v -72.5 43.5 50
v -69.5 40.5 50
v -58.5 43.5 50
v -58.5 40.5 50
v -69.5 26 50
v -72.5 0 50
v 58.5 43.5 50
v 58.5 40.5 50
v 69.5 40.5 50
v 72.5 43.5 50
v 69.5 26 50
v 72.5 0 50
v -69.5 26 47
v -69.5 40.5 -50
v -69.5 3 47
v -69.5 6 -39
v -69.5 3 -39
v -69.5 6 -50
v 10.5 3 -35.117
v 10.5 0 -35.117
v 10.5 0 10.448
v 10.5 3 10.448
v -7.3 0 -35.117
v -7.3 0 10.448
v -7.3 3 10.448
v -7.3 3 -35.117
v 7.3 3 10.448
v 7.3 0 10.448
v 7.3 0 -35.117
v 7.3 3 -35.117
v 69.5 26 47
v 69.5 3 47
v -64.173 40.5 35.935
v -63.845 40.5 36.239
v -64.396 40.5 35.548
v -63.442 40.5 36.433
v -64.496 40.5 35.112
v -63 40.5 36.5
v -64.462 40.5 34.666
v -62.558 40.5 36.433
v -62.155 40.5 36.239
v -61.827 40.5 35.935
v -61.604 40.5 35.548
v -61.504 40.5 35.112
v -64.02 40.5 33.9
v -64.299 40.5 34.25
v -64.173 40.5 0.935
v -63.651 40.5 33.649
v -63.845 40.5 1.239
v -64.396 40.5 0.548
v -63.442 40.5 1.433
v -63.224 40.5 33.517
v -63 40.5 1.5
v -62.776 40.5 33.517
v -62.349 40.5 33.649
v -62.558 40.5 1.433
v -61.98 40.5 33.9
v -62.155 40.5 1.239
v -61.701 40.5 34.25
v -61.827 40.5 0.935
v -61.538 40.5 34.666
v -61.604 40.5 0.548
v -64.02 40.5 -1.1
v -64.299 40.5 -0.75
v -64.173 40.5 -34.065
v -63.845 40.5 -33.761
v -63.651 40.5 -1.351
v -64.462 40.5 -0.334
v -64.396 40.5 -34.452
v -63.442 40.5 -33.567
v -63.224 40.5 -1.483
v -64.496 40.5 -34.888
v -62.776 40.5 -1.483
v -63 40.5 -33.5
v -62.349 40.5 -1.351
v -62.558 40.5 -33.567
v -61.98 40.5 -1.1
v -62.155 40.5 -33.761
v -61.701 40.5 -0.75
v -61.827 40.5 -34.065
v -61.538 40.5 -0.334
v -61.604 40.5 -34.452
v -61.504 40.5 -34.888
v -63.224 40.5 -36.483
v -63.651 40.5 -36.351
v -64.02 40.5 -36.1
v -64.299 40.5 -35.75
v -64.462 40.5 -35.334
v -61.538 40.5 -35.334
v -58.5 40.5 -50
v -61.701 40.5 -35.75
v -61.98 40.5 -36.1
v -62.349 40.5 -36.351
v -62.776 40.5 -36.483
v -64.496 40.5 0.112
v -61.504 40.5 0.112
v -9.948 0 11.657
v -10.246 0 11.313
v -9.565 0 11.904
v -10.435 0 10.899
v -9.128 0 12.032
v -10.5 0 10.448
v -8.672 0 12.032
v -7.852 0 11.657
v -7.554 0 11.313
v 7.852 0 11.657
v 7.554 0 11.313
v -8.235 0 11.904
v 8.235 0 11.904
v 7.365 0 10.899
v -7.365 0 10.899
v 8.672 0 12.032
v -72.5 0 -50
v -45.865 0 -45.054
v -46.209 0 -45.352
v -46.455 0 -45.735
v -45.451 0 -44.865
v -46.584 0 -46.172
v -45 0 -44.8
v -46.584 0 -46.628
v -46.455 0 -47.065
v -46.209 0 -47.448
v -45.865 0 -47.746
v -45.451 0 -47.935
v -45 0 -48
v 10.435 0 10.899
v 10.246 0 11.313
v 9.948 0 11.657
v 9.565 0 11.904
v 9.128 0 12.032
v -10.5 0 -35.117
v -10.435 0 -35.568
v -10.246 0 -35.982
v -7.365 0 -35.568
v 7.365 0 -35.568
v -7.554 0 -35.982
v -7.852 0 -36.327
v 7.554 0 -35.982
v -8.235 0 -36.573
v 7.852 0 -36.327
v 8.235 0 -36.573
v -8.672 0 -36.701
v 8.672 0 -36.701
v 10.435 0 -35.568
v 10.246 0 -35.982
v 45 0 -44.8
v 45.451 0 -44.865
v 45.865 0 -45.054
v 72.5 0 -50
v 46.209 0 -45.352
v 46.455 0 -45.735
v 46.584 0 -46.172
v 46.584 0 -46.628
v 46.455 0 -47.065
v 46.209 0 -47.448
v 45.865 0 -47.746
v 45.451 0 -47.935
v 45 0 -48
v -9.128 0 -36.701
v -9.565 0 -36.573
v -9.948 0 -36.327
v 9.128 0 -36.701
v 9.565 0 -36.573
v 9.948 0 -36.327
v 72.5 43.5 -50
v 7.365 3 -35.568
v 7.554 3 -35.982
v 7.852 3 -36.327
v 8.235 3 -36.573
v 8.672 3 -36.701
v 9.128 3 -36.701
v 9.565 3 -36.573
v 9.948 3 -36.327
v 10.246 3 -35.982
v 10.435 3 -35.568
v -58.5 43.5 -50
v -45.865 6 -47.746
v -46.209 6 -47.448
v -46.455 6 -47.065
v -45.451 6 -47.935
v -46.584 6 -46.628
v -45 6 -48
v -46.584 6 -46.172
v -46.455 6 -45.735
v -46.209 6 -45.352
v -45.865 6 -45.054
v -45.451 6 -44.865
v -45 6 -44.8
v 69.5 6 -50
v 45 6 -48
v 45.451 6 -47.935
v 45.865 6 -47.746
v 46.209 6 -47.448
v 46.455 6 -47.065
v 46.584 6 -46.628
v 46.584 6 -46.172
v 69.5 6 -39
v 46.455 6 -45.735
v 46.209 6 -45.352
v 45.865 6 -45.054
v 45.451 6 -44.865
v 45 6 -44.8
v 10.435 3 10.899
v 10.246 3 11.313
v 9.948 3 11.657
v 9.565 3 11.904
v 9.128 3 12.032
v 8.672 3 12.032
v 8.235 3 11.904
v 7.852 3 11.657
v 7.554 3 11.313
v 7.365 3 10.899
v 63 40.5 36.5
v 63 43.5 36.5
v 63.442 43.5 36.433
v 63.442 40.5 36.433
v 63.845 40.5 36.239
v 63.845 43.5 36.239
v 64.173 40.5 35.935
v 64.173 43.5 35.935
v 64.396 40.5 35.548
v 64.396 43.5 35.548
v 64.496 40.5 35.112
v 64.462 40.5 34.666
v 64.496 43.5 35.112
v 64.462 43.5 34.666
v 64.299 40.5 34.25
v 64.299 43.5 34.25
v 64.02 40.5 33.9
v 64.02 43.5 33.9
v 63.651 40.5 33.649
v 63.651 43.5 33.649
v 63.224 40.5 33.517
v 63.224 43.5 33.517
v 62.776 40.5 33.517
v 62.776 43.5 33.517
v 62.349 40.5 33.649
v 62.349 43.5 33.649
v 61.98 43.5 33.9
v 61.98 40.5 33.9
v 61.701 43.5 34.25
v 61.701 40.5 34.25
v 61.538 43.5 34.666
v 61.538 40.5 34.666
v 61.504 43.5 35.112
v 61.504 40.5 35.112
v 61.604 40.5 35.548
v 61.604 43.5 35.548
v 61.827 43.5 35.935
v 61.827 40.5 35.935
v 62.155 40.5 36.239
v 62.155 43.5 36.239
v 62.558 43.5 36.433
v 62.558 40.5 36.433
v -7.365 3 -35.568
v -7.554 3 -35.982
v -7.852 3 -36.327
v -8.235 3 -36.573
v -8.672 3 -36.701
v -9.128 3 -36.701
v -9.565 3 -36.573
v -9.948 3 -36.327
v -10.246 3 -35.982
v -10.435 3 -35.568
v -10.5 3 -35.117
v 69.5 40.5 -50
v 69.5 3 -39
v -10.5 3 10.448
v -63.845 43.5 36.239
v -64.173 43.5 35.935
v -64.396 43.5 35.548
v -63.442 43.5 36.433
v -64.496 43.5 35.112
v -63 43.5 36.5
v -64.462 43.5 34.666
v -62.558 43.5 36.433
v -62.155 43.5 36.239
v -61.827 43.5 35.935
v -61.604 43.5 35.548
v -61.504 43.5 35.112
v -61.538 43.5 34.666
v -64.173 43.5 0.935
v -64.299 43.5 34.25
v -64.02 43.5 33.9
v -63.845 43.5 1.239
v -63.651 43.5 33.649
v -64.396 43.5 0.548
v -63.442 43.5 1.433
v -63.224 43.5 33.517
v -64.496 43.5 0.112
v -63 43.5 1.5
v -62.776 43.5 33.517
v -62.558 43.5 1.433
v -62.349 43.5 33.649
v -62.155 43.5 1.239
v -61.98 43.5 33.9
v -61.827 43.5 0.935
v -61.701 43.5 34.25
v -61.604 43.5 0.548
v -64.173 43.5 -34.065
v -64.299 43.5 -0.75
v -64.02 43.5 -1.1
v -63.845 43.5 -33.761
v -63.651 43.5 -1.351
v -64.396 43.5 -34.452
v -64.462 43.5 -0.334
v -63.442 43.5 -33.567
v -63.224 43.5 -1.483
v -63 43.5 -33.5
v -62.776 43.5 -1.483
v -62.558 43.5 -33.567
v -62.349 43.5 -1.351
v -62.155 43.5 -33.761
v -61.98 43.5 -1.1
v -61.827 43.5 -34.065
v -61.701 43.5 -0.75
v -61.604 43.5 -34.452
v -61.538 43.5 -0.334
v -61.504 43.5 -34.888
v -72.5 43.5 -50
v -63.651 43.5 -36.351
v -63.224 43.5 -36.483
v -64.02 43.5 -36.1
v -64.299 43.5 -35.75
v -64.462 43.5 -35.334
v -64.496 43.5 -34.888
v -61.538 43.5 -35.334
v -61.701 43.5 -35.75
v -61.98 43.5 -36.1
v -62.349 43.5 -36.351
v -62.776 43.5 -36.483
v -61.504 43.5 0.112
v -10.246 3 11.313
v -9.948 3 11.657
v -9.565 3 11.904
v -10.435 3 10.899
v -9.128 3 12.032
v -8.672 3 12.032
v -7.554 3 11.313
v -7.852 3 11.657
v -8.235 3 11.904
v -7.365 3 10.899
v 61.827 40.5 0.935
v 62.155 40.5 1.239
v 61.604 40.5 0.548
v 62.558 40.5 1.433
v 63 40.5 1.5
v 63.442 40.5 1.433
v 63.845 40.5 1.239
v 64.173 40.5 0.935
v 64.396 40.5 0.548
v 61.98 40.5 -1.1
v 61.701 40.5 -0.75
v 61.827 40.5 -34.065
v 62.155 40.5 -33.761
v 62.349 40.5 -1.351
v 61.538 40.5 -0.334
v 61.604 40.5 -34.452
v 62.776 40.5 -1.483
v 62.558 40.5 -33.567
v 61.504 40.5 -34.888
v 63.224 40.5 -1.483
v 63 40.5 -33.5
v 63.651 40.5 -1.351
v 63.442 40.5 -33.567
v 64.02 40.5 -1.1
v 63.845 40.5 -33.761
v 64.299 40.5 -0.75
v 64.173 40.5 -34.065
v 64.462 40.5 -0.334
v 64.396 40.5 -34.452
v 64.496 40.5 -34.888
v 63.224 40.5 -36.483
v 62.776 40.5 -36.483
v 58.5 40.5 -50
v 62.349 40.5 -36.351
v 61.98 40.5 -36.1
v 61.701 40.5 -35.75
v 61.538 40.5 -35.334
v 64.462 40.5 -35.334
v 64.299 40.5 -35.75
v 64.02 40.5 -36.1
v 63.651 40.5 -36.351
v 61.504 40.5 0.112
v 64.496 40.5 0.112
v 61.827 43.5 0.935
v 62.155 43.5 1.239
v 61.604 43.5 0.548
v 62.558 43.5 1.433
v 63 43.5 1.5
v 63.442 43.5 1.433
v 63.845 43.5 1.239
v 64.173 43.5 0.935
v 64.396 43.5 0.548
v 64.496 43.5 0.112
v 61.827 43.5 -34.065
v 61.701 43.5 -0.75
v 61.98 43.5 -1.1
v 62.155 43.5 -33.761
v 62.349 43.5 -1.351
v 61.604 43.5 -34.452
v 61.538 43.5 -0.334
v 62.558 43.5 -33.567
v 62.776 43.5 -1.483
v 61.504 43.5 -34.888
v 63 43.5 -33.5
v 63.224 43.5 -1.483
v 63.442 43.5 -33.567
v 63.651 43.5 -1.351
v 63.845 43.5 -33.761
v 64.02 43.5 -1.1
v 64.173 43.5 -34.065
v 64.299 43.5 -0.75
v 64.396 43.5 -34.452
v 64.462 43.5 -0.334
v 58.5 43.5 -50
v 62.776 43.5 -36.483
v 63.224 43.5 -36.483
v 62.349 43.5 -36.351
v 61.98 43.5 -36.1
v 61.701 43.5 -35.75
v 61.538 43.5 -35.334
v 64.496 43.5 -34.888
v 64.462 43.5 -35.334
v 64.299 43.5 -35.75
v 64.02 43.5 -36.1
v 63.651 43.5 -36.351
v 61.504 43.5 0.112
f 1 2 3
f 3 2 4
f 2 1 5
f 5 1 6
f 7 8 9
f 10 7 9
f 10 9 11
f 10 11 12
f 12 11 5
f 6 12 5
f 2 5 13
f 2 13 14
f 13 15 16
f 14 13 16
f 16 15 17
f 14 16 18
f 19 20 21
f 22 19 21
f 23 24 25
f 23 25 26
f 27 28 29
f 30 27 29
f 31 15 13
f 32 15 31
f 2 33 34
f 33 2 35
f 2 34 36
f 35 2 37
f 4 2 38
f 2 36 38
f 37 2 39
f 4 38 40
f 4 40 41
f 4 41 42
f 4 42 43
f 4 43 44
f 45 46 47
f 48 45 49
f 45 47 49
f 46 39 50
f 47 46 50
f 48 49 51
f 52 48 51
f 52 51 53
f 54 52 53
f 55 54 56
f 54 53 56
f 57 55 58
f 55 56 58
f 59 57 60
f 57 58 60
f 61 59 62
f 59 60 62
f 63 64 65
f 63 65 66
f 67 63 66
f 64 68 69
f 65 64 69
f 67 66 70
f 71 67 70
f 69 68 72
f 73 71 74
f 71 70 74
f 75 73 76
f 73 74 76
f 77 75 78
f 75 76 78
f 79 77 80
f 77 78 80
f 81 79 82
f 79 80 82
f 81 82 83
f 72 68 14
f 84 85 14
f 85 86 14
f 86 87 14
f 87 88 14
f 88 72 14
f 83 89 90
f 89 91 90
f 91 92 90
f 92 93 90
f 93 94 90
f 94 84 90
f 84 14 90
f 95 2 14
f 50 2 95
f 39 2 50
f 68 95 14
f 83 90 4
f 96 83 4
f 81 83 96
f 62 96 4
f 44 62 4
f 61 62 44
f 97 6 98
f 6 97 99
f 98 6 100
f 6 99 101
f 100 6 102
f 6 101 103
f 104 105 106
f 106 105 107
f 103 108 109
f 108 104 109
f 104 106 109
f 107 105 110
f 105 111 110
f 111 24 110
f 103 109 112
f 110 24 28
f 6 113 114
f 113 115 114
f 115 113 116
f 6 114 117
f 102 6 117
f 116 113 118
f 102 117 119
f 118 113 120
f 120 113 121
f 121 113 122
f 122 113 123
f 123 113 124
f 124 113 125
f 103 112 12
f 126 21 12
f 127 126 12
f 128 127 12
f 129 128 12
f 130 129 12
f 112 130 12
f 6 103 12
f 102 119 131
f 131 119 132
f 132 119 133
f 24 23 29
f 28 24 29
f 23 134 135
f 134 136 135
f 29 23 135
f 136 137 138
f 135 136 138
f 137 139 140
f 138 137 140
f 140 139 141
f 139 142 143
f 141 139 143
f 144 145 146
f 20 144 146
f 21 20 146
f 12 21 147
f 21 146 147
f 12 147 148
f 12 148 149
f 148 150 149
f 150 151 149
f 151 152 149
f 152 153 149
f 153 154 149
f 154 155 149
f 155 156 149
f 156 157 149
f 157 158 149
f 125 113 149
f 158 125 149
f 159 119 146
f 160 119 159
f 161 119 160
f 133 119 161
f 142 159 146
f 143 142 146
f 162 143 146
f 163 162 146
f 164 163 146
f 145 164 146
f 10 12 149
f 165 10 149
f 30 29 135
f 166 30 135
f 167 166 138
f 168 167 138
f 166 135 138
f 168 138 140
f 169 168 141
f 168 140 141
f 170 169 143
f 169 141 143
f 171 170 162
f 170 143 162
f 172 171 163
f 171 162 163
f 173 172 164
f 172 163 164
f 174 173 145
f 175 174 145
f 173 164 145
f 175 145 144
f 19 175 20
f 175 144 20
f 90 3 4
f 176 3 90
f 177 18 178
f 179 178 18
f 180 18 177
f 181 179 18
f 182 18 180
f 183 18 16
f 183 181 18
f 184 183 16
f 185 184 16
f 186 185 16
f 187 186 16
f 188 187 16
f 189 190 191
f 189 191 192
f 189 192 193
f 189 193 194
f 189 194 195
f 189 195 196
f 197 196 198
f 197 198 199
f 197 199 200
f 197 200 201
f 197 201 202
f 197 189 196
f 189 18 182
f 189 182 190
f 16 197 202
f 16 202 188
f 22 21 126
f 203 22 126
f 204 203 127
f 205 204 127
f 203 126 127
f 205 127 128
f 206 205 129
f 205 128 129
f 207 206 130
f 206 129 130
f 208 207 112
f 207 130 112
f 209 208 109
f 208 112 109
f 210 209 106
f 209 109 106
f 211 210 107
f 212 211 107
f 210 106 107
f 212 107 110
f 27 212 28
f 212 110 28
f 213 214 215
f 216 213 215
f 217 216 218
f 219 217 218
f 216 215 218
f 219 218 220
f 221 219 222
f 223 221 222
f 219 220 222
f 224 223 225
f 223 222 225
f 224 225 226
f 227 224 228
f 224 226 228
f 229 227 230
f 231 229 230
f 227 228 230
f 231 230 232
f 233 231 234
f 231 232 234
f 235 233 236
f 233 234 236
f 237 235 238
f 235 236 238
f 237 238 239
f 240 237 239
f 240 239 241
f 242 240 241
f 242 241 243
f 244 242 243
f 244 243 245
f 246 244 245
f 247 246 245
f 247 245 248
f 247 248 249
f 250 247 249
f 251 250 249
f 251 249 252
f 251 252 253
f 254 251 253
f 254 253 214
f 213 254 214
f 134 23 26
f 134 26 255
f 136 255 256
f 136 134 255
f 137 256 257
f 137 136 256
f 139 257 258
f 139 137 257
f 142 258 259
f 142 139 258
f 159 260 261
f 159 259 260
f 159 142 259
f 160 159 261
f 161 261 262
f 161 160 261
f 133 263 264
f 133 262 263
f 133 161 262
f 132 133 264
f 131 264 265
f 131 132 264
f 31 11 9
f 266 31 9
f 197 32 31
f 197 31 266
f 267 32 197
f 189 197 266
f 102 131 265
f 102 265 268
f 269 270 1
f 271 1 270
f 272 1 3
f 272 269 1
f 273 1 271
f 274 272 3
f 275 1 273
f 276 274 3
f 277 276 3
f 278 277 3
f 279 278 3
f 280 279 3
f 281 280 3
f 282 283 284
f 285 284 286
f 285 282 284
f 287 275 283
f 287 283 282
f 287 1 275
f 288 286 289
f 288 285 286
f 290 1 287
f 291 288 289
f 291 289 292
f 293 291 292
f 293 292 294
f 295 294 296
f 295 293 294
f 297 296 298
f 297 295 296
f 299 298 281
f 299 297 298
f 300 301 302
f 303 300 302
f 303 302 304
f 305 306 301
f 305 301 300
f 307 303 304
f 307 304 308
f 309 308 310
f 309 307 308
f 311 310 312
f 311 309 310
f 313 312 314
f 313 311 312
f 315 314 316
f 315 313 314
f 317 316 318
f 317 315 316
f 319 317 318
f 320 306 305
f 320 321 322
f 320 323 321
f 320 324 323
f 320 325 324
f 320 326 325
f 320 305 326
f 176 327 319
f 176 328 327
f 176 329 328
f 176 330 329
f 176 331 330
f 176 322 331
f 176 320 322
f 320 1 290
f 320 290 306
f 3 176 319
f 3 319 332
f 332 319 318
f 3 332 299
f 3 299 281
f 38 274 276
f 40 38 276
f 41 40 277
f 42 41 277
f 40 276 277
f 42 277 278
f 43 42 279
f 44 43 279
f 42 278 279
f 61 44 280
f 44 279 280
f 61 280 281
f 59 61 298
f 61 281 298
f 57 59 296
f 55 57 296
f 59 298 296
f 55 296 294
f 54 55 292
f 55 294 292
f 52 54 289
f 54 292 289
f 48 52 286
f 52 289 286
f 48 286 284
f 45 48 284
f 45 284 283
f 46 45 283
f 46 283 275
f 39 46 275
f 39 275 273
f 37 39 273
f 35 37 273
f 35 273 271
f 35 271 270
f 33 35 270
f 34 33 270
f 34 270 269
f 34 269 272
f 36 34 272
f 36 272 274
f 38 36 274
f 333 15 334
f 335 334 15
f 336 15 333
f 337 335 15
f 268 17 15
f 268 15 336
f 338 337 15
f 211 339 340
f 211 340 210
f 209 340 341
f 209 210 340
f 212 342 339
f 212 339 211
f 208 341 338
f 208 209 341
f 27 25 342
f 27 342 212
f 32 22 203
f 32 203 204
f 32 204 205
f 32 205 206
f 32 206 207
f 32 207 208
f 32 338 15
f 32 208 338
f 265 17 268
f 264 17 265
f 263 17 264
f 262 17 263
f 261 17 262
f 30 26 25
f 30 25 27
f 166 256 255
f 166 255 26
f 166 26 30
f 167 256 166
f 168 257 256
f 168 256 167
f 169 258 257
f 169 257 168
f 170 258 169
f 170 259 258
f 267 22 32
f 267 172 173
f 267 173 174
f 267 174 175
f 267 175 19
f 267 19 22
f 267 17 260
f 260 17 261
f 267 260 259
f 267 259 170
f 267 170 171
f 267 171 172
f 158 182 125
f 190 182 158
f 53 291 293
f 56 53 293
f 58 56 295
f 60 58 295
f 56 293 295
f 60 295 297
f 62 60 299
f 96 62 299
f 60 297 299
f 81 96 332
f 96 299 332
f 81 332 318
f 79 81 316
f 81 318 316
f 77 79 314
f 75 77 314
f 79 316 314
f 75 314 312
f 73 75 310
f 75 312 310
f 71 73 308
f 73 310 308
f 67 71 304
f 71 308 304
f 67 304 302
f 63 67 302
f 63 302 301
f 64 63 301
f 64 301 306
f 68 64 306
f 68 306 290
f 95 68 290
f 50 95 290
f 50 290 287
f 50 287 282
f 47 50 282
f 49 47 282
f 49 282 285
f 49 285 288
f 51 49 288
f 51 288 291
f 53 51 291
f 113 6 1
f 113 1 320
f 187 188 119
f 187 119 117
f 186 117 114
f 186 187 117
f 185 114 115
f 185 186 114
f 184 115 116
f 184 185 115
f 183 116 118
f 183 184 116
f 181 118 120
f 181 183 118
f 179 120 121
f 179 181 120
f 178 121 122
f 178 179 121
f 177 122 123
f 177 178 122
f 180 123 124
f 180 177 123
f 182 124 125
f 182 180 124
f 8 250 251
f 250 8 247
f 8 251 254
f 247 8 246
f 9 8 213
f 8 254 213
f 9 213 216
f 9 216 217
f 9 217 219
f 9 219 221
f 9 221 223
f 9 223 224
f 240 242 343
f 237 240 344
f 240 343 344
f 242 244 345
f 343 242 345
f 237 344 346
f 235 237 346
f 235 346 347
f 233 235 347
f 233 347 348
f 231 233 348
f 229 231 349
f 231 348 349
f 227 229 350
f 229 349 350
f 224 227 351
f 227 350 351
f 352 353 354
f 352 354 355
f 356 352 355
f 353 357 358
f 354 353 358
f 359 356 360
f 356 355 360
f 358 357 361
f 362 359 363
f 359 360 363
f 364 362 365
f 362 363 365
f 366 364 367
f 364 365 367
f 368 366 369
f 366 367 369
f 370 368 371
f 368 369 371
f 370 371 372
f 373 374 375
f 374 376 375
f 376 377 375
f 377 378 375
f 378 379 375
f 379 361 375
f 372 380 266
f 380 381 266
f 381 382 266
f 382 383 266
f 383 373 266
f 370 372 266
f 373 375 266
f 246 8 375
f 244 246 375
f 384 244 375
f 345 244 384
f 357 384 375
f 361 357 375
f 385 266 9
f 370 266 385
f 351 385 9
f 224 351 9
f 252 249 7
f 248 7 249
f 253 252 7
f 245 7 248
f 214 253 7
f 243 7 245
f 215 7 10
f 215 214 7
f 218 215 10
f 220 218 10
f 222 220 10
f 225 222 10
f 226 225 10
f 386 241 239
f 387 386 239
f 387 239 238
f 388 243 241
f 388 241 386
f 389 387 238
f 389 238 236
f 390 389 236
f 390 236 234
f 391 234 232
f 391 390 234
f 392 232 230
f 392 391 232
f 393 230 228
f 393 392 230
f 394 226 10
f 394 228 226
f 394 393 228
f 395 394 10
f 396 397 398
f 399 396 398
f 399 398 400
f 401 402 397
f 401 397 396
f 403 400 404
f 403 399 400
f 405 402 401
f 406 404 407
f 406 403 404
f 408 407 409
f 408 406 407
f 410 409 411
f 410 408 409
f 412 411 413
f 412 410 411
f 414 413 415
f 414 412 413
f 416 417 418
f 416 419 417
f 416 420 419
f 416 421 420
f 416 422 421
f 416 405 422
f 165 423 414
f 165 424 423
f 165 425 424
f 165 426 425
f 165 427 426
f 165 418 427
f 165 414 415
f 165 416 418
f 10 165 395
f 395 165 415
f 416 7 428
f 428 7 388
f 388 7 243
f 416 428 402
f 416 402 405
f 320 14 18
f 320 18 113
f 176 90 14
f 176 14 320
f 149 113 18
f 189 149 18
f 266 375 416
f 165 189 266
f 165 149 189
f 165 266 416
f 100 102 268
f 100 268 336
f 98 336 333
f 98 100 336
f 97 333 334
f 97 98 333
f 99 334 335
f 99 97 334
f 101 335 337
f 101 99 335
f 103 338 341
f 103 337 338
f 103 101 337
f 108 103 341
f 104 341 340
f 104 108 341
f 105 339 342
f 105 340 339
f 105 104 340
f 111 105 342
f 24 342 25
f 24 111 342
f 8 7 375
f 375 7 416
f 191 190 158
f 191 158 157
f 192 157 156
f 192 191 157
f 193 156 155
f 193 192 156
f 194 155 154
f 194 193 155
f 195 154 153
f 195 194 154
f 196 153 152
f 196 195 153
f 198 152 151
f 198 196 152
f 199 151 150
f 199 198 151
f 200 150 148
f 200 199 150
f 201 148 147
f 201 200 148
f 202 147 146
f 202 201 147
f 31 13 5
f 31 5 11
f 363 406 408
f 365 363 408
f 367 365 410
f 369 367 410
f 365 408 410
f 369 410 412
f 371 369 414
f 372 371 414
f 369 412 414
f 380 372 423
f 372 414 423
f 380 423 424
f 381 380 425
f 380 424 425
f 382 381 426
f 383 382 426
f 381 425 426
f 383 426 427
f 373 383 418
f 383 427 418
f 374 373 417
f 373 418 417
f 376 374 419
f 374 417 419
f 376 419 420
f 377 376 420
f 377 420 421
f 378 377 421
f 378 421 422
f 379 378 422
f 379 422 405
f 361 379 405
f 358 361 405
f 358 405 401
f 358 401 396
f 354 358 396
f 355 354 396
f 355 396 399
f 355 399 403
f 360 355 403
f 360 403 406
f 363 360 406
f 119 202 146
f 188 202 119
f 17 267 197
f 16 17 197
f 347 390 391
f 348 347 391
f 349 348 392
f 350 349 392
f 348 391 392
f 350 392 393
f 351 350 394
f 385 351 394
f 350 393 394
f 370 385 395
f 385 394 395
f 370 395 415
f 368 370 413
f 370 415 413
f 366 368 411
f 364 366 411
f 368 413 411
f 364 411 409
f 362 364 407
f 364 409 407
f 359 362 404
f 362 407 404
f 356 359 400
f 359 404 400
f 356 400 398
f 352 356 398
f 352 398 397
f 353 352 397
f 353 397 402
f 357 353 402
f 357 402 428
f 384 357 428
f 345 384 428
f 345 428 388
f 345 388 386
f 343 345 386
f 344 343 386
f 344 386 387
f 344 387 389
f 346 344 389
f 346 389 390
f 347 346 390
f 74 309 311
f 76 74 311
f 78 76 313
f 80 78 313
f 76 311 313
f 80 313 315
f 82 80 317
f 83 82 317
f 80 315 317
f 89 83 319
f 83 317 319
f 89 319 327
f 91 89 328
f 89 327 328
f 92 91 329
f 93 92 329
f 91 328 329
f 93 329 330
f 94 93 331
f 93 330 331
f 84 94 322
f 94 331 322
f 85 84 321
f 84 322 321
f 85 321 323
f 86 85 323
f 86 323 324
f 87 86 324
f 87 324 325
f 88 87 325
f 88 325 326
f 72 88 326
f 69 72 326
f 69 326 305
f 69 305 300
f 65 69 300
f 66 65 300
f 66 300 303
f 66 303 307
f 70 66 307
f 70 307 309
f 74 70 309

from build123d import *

# Parameters (mm, degrees)
SKETCH_1_W          = 145
SKETCH_1_H          = 100
EXTRUDE_1_DEPTH     = 3
EXTRUDE_START       = 3
SKETCH_2_W          = 3
SKETCH_2_H          = 100
EXTRUDE_2_DEPTH     = 40.5
SKETCH_3_W          = 139
SKETCH_3_H          = 3
EXTRUDE_3_DEPTH     = 23
SKETCH_4_W          = 14
SKETCH_4_H          = 100
EXTRUDE_4_DEPTH     = 3
CUT_EXTRUDE_1_REACH = 100.227
SKETCH_5_R          = 1.5
CUT_EXTRUDE_2_REACH = 100.227
EXTRUDE_5_REACH     = 158.704
SKETCH_7_W          = 11
SKETCH_7_H          = 3
CUT_EXTRUDE_3_REACH = 97.721


with BuildPart() as part:
    # 草图1 → 凸台-拉伸1 (new body)
    with BuildSketch(Plane(origin=(0, 0, 0), x_dir=(1, 0, 0), z_dir=(0, 1, 0))):
        Rectangle(SKETCH_1_W, SKETCH_1_H)
    extrude(amount=EXTRUDE_1_DEPTH)

    # 草图2 → 凸台-拉伸2 (add)
    with BuildSketch(Plane(origin=(0, 0, 0), x_dir=(1, 0, 0), z_dir=(0, 1, 0)).offset(EXTRUDE_START)):
        with Locations((-71, 0)):
            Rectangle(SKETCH_2_W, SKETCH_2_H)
        with Locations((71, 0)):
            Rectangle(SKETCH_2_W, SKETCH_2_H)
    extrude(amount=EXTRUDE_2_DEPTH)

    # 草图3 → 凸台-拉伸3 (add)
    with BuildSketch(Plane(origin=(0, 3, 0), x_dir=(1, 0, 0), z_dir=(0, 1, 0))):
        with Locations((0, -48.5)):
            Rectangle(SKETCH_3_W, SKETCH_3_H)
    extrude(amount=EXTRUDE_3_DEPTH)

    # 草图4 → 凸台-拉伸4 (add)
    with BuildSketch(Plane(origin=(0, 43.5, 0), x_dir=(1, 0, 0), z_dir=(0, 1, 0))):
        with Locations((-65.5, 0)):
            Rectangle(SKETCH_4_W, SKETCH_4_H)
        with Locations((65.5, 0)):
            Rectangle(SKETCH_4_W, SKETCH_4_H)
    extrude(amount=-EXTRUDE_4_DEPTH)

    # 草图5 → 切除-拉伸1 (cut, up to next)
    with BuildSketch(Plane(origin=(0, 43.5, 0), x_dir=(1, 0, 0), z_dir=(0, 1, 0)), mode=Mode.PRIVATE) as cut_extrude_1_sk1:
        with Locations(Location((-63, 35, 0), (0, 0, 270))):
            Circle(SKETCH_5_R)
    cut_extrude_1_tool1 = extrude(cut_extrude_1_sk1.sketch, amount=-CUT_EXTRUDE_1_REACH, mode=Mode.PRIVATE) & part.part
    # 草图5 → 切除-拉伸1 (cut, up to next)
    with BuildSketch(Plane(origin=(0, 43.5, 0), x_dir=(1, 0, 0), z_dir=(0, 1, 0)), mode=Mode.PRIVATE) as cut_extrude_1_sk2:
        with Locations(Location((-63, 0, 0), (0, 0, 270))):
            Circle(SKETCH_5_R)
    cut_extrude_1_tool2 = extrude(cut_extrude_1_sk2.sketch, amount=-CUT_EXTRUDE_1_REACH, mode=Mode.PRIVATE) & part.part
    # 草图5 → 切除-拉伸1 (cut, up to next)
    with BuildSketch(Plane(origin=(0, 43.5, 0), x_dir=(1, 0, 0), z_dir=(0, 1, 0)), mode=Mode.PRIVATE) as cut_extrude_1_sk3:
        with Locations(Location((-63, -35, 0), (0, 0, 270))):
            Circle(SKETCH_5_R)
    cut_extrude_1_tool3 = extrude(cut_extrude_1_sk3.sketch, amount=-CUT_EXTRUDE_1_REACH, mode=Mode.PRIVATE) & part.part
    # 草图5 → 切除-拉伸1 (cut, up to next)
    with BuildSketch(Plane(origin=(0, 43.5, 0), x_dir=(1, 0, 0), z_dir=(0, 1, 0)), mode=Mode.PRIVATE) as cut_extrude_1_sk4:
        with Locations(Location((63, -35, 0), (0, 0, 270))):
            Circle(SKETCH_5_R)
    cut_extrude_1_tool4 = extrude(cut_extrude_1_sk4.sketch, amount=-CUT_EXTRUDE_1_REACH, mode=Mode.PRIVATE) & part.part
    # 草图5 → 切除-拉伸1 (cut, up to next)
    with BuildSketch(Plane(origin=(0, 43.5, 0), x_dir=(1, 0, 0), z_dir=(0, 1, 0)), mode=Mode.PRIVATE) as cut_extrude_1_sk5:
        with Locations(Location((63, 0, 0), (0, 0, 270))):
            Circle(SKETCH_5_R)
    cut_extrude_1_tool5 = extrude(cut_extrude_1_sk5.sketch, amount=-CUT_EXTRUDE_1_REACH, mode=Mode.PRIVATE) & part.part
    # 草图5 → 切除-拉伸1 (cut, up to next)
    with BuildSketch(Plane(origin=(0, 43.5, 0), x_dir=(1, 0, 0), z_dir=(0, 1, 0)), mode=Mode.PRIVATE) as cut_extrude_1_sk6:
        with Locations(Location((63, 35, 0), (0, 0, 270))):
            Circle(SKETCH_5_R)
    cut_extrude_1_tool6 = extrude(cut_extrude_1_sk6.sketch, amount=-CUT_EXTRUDE_1_REACH, mode=Mode.PRIVATE) & part.part
    add(cut_extrude_1_tool1.solids().sort_by_distance((-63, 43.5, -35))[0], mode=Mode.SUBTRACT)
    add(cut_extrude_1_tool2.solids().sort_by_distance((-63, 43.5, 0))[0], mode=Mode.SUBTRACT)
    add(cut_extrude_1_tool3.solids().sort_by_distance((-63, 43.5, 35))[0], mode=Mode.SUBTRACT)
    add(cut_extrude_1_tool4.solids().sort_by_distance((63, 43.5, 35))[0], mode=Mode.SUBTRACT)
    add(cut_extrude_1_tool5.solids().sort_by_distance((63, 43.5, 0))[0], mode=Mode.SUBTRACT)
    add(cut_extrude_1_tool6.solids().sort_by_distance((63, 43.5, -35))[0], mode=Mode.SUBTRACT)

    # 草图6 → 切除-拉伸2 (cut, up to next)
    with BuildSketch(Plane.XZ, mode=Mode.PRIVATE) as cut_extrude_2_sk1:
        with BuildLine():
            Line((-7.3, 10.448254834), (-7.3, -35.117406069))
            ThreePointArc((-7.3, -35.117406069), (-8.9, -36.717406069), (-10.5, -35.117406069))
            Line((-10.5, -35.117406069), (-10.5, 10.448254834))
            ThreePointArc((-10.5, 10.448254834), (-8.9, 12.048254834), (-7.3, 10.448254834))
        make_face()
    cut_extrude_2_tool1 = extrude(cut_extrude_2_sk1.sketch, amount=-CUT_EXTRUDE_2_REACH, mode=Mode.PRIVATE) & part.part
    # 草图6 → 切除-拉伸2 (cut, up to next)
    with BuildSketch(Plane.XZ, mode=Mode.PRIVATE) as cut_extrude_2_sk2:
        with BuildLine():
            Line((7.3, 10.448254834), (7.3, -35.117406069))
            ThreePointArc((7.3, -35.117406069), (8.9, -36.717406069), (10.5, -35.117406069))
            Line((10.5, -35.117406069), (10.5, 10.448254834))
            ThreePointArc((10.5, 10.448254834), (8.9, 12.048254834), (7.3, 10.448254834))
        make_face()
    cut_extrude_2_tool2 = extrude(cut_extrude_2_sk2.sketch, amount=-CUT_EXTRUDE_2_REACH, mode=Mode.PRIVATE) & part.part
    add(cut_extrude_2_tool1.solids().sort_by_distance((-8.9, 0, -12.334576))[0], mode=Mode.SUBTRACT)
    add(cut_extrude_2_tool2.solids().sort_by_distance((8.9, 0, -12.334576))[0], mode=Mode.SUBTRACT)

    # 草图7 → 凸台-拉伸5 (add, up to next)
    with BuildSketch(Plane.ZY.offset(-69.5), mode=Mode.PRIVATE) as extrude_5_sk1:
        with Locations((-44.5, 4.5)):
            Rectangle(SKETCH_7_W, SKETCH_7_H)
    extrude_5_tool1 = extrude(extrude_5_sk1.sketch, amount=EXTRUDE_5_REACH, mode=Mode.PRIVATE) - part.part
    add(extrude_5_tool1.solids().sort_by_distance((69.5, 4.5, -44.5))[0])

    # 草图8 → 切除-拉伸3 (cut, up to next)
    with BuildSketch(Plane(origin=(0, 6, 0), x_dir=(1, 0, 0), z_dir=(0, 1, 0)), mode=Mode.PRIVATE) as cut_extrude_3_sk1:
        with BuildLine():
            Line((-45, 48), (45, 48))
            ThreePointArc((45, 48), (46.6, 46.4), (45, 44.8))
            Line((45, 44.8), (-45, 44.8))
            ThreePointArc((-45, 44.8), (-46.6, 46.4), (-45, 48))
        make_face()
    cut_extrude_3_tool1 = extrude(cut_extrude_3_sk1.sketch, amount=-CUT_EXTRUDE_3_REACH, mode=Mode.PRIVATE) & part.part
    add(cut_extrude_3_tool1.solids().sort_by_distance((0, 6, -46.4))[0], mode=Mode.SUBTRACT)


solid = part.part
